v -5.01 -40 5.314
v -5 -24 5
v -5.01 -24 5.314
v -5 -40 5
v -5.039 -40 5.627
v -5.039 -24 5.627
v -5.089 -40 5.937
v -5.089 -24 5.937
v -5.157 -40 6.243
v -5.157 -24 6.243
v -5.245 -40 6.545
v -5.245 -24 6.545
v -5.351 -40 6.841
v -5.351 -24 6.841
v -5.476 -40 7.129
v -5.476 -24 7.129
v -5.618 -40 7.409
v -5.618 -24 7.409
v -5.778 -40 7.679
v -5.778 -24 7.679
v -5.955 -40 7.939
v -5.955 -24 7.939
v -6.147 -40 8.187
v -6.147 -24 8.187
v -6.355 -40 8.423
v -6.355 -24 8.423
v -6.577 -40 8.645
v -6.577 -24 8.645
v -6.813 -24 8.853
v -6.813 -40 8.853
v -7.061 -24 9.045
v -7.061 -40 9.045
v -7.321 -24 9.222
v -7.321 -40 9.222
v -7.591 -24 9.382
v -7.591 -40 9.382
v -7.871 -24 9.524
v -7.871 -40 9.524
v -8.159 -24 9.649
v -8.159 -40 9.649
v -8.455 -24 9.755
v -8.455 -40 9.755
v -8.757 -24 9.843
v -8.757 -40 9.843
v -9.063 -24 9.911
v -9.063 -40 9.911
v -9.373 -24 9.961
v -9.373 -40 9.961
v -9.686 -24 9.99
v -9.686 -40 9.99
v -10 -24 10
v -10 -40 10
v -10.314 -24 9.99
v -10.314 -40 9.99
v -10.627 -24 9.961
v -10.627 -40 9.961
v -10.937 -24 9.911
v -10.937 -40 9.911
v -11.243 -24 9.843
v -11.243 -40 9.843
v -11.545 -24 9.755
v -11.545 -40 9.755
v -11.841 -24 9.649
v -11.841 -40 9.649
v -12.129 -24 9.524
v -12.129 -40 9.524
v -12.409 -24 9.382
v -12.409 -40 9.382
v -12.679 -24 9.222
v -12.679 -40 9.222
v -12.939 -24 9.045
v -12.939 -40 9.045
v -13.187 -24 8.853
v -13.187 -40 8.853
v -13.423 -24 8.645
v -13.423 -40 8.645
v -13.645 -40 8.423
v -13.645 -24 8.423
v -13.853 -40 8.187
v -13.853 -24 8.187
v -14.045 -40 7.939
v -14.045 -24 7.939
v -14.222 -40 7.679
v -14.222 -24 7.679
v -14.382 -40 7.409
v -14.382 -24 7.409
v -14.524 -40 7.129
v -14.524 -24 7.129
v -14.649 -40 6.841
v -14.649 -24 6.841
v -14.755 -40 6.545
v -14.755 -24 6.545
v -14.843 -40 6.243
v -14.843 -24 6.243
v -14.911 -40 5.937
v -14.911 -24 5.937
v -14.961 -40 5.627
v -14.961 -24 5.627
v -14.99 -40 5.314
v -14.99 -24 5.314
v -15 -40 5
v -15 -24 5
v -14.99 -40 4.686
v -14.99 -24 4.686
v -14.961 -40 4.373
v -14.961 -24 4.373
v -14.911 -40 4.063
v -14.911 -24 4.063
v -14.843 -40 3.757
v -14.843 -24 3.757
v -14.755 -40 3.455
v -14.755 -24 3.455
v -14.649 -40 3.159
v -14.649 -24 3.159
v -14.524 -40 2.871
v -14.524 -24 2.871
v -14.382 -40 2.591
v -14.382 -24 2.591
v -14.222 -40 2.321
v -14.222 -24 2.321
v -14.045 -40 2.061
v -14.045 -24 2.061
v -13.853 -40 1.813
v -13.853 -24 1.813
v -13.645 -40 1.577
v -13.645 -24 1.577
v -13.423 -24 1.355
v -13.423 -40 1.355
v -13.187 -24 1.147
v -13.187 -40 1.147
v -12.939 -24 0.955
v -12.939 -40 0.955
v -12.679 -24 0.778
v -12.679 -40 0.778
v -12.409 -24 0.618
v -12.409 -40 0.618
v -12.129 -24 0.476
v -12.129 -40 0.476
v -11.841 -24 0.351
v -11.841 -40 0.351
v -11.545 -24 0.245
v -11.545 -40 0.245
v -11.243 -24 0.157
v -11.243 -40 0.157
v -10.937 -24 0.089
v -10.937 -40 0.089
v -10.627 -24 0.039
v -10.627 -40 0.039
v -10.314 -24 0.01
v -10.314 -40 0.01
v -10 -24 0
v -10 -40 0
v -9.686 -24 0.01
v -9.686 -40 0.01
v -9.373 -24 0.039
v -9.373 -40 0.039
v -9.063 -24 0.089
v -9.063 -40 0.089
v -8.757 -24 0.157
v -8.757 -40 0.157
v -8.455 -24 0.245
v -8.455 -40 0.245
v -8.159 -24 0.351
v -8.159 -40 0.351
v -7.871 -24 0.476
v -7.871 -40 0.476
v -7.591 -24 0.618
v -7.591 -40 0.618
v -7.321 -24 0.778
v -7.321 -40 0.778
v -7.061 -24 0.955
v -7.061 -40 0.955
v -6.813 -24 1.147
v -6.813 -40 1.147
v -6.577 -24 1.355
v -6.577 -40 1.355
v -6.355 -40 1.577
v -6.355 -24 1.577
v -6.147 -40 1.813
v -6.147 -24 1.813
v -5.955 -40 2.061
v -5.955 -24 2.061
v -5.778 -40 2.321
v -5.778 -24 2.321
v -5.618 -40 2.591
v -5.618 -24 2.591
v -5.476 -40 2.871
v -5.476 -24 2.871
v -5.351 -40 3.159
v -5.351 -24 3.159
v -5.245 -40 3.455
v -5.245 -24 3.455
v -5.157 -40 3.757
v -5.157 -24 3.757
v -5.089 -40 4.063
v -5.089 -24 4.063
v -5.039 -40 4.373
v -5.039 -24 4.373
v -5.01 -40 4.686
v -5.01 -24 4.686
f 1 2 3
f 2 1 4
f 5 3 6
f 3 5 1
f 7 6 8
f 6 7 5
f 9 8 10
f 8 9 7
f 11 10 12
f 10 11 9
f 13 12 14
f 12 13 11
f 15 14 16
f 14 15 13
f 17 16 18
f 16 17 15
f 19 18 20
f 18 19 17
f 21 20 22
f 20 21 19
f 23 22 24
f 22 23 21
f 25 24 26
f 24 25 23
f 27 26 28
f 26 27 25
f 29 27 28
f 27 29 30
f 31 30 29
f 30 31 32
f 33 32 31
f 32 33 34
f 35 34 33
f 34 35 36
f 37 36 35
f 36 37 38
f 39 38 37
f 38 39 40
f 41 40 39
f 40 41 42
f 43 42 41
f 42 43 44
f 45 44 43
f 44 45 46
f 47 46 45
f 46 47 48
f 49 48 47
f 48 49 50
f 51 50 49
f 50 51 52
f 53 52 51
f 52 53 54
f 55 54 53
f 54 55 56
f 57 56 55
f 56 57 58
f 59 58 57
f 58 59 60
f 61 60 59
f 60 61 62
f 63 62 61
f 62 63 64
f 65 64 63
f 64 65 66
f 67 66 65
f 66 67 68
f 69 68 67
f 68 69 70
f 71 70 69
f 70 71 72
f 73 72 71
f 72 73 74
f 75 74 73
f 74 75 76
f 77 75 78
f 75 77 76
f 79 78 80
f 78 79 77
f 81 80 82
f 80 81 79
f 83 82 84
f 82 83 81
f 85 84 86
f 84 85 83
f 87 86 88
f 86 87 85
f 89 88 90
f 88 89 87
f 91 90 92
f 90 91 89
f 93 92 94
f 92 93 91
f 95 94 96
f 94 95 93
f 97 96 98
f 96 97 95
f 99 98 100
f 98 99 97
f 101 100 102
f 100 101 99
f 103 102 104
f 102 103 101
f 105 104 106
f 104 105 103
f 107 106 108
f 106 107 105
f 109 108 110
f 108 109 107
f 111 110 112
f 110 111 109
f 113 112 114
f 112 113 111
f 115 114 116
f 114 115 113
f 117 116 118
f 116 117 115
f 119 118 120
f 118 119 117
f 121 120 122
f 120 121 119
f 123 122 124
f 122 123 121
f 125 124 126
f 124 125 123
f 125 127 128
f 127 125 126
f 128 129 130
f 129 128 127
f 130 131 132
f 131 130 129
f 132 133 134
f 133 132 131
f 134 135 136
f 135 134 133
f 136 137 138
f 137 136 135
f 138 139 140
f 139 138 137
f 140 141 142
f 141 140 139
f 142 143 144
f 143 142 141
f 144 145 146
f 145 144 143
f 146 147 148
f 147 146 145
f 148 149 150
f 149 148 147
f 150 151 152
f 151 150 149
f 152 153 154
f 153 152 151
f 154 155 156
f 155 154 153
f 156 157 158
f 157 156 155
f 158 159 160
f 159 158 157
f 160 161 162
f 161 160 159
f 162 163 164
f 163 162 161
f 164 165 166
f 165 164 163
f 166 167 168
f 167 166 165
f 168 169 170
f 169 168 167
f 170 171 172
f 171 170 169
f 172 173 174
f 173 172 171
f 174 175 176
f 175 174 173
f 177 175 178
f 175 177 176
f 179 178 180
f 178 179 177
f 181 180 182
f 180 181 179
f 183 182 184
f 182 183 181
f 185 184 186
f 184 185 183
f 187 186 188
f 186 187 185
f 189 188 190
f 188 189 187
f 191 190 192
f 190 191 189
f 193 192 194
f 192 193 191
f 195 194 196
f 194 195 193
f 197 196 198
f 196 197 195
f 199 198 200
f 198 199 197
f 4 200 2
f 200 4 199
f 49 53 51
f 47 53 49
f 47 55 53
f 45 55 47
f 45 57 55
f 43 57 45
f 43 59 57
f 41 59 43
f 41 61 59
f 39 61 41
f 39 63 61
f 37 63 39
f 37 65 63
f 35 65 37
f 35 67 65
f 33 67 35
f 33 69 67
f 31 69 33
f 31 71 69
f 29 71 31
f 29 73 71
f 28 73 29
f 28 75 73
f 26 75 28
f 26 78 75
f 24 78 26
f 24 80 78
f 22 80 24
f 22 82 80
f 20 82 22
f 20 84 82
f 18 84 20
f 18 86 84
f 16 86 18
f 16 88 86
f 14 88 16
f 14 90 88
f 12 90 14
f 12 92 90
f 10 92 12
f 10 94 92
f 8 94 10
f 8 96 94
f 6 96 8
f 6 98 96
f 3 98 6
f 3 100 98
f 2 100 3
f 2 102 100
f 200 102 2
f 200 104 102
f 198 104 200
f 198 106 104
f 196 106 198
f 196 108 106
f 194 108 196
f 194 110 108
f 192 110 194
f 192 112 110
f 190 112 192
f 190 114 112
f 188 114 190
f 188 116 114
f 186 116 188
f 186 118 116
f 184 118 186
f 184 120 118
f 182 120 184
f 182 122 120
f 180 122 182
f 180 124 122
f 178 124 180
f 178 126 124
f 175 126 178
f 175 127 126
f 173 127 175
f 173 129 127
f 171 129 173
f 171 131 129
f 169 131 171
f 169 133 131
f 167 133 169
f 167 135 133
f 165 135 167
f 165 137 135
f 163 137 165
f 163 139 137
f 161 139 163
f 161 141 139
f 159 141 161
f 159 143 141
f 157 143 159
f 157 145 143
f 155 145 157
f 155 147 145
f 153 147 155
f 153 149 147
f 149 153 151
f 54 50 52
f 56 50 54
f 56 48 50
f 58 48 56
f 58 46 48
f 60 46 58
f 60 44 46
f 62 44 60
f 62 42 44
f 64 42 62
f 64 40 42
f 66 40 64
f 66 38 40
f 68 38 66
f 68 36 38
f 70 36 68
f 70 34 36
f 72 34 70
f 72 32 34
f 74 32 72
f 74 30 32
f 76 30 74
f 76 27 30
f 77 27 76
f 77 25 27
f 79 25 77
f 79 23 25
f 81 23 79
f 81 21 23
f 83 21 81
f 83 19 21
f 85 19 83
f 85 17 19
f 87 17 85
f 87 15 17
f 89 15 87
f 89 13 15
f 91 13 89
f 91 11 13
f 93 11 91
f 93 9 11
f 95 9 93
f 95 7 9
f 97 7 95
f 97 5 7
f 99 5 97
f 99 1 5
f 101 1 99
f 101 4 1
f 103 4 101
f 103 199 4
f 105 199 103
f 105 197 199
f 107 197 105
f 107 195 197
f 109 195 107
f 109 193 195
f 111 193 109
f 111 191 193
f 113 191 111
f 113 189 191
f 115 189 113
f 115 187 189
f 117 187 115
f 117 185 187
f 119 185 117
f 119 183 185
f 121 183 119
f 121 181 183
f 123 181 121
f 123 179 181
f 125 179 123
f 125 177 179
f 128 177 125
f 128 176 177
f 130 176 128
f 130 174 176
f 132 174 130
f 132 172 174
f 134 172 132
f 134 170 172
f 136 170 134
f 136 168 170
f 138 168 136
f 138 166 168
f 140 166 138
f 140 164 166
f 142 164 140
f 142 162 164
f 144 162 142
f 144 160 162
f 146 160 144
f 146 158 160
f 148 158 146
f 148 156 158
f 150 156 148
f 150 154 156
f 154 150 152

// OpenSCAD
union() {
difference() {
translate ([0,0,9.9])
scale([.5/3,.5/3,0.1])
  surface(file = "unologo.png", center = true, invert = true);
translate ([0,0,-.5])
cube([100,100,1],true);    

}
translate ([-10,-32,5])
rotate ([90,0,0])
cylinder (16, r=5, center=true, $fn=100);
}
